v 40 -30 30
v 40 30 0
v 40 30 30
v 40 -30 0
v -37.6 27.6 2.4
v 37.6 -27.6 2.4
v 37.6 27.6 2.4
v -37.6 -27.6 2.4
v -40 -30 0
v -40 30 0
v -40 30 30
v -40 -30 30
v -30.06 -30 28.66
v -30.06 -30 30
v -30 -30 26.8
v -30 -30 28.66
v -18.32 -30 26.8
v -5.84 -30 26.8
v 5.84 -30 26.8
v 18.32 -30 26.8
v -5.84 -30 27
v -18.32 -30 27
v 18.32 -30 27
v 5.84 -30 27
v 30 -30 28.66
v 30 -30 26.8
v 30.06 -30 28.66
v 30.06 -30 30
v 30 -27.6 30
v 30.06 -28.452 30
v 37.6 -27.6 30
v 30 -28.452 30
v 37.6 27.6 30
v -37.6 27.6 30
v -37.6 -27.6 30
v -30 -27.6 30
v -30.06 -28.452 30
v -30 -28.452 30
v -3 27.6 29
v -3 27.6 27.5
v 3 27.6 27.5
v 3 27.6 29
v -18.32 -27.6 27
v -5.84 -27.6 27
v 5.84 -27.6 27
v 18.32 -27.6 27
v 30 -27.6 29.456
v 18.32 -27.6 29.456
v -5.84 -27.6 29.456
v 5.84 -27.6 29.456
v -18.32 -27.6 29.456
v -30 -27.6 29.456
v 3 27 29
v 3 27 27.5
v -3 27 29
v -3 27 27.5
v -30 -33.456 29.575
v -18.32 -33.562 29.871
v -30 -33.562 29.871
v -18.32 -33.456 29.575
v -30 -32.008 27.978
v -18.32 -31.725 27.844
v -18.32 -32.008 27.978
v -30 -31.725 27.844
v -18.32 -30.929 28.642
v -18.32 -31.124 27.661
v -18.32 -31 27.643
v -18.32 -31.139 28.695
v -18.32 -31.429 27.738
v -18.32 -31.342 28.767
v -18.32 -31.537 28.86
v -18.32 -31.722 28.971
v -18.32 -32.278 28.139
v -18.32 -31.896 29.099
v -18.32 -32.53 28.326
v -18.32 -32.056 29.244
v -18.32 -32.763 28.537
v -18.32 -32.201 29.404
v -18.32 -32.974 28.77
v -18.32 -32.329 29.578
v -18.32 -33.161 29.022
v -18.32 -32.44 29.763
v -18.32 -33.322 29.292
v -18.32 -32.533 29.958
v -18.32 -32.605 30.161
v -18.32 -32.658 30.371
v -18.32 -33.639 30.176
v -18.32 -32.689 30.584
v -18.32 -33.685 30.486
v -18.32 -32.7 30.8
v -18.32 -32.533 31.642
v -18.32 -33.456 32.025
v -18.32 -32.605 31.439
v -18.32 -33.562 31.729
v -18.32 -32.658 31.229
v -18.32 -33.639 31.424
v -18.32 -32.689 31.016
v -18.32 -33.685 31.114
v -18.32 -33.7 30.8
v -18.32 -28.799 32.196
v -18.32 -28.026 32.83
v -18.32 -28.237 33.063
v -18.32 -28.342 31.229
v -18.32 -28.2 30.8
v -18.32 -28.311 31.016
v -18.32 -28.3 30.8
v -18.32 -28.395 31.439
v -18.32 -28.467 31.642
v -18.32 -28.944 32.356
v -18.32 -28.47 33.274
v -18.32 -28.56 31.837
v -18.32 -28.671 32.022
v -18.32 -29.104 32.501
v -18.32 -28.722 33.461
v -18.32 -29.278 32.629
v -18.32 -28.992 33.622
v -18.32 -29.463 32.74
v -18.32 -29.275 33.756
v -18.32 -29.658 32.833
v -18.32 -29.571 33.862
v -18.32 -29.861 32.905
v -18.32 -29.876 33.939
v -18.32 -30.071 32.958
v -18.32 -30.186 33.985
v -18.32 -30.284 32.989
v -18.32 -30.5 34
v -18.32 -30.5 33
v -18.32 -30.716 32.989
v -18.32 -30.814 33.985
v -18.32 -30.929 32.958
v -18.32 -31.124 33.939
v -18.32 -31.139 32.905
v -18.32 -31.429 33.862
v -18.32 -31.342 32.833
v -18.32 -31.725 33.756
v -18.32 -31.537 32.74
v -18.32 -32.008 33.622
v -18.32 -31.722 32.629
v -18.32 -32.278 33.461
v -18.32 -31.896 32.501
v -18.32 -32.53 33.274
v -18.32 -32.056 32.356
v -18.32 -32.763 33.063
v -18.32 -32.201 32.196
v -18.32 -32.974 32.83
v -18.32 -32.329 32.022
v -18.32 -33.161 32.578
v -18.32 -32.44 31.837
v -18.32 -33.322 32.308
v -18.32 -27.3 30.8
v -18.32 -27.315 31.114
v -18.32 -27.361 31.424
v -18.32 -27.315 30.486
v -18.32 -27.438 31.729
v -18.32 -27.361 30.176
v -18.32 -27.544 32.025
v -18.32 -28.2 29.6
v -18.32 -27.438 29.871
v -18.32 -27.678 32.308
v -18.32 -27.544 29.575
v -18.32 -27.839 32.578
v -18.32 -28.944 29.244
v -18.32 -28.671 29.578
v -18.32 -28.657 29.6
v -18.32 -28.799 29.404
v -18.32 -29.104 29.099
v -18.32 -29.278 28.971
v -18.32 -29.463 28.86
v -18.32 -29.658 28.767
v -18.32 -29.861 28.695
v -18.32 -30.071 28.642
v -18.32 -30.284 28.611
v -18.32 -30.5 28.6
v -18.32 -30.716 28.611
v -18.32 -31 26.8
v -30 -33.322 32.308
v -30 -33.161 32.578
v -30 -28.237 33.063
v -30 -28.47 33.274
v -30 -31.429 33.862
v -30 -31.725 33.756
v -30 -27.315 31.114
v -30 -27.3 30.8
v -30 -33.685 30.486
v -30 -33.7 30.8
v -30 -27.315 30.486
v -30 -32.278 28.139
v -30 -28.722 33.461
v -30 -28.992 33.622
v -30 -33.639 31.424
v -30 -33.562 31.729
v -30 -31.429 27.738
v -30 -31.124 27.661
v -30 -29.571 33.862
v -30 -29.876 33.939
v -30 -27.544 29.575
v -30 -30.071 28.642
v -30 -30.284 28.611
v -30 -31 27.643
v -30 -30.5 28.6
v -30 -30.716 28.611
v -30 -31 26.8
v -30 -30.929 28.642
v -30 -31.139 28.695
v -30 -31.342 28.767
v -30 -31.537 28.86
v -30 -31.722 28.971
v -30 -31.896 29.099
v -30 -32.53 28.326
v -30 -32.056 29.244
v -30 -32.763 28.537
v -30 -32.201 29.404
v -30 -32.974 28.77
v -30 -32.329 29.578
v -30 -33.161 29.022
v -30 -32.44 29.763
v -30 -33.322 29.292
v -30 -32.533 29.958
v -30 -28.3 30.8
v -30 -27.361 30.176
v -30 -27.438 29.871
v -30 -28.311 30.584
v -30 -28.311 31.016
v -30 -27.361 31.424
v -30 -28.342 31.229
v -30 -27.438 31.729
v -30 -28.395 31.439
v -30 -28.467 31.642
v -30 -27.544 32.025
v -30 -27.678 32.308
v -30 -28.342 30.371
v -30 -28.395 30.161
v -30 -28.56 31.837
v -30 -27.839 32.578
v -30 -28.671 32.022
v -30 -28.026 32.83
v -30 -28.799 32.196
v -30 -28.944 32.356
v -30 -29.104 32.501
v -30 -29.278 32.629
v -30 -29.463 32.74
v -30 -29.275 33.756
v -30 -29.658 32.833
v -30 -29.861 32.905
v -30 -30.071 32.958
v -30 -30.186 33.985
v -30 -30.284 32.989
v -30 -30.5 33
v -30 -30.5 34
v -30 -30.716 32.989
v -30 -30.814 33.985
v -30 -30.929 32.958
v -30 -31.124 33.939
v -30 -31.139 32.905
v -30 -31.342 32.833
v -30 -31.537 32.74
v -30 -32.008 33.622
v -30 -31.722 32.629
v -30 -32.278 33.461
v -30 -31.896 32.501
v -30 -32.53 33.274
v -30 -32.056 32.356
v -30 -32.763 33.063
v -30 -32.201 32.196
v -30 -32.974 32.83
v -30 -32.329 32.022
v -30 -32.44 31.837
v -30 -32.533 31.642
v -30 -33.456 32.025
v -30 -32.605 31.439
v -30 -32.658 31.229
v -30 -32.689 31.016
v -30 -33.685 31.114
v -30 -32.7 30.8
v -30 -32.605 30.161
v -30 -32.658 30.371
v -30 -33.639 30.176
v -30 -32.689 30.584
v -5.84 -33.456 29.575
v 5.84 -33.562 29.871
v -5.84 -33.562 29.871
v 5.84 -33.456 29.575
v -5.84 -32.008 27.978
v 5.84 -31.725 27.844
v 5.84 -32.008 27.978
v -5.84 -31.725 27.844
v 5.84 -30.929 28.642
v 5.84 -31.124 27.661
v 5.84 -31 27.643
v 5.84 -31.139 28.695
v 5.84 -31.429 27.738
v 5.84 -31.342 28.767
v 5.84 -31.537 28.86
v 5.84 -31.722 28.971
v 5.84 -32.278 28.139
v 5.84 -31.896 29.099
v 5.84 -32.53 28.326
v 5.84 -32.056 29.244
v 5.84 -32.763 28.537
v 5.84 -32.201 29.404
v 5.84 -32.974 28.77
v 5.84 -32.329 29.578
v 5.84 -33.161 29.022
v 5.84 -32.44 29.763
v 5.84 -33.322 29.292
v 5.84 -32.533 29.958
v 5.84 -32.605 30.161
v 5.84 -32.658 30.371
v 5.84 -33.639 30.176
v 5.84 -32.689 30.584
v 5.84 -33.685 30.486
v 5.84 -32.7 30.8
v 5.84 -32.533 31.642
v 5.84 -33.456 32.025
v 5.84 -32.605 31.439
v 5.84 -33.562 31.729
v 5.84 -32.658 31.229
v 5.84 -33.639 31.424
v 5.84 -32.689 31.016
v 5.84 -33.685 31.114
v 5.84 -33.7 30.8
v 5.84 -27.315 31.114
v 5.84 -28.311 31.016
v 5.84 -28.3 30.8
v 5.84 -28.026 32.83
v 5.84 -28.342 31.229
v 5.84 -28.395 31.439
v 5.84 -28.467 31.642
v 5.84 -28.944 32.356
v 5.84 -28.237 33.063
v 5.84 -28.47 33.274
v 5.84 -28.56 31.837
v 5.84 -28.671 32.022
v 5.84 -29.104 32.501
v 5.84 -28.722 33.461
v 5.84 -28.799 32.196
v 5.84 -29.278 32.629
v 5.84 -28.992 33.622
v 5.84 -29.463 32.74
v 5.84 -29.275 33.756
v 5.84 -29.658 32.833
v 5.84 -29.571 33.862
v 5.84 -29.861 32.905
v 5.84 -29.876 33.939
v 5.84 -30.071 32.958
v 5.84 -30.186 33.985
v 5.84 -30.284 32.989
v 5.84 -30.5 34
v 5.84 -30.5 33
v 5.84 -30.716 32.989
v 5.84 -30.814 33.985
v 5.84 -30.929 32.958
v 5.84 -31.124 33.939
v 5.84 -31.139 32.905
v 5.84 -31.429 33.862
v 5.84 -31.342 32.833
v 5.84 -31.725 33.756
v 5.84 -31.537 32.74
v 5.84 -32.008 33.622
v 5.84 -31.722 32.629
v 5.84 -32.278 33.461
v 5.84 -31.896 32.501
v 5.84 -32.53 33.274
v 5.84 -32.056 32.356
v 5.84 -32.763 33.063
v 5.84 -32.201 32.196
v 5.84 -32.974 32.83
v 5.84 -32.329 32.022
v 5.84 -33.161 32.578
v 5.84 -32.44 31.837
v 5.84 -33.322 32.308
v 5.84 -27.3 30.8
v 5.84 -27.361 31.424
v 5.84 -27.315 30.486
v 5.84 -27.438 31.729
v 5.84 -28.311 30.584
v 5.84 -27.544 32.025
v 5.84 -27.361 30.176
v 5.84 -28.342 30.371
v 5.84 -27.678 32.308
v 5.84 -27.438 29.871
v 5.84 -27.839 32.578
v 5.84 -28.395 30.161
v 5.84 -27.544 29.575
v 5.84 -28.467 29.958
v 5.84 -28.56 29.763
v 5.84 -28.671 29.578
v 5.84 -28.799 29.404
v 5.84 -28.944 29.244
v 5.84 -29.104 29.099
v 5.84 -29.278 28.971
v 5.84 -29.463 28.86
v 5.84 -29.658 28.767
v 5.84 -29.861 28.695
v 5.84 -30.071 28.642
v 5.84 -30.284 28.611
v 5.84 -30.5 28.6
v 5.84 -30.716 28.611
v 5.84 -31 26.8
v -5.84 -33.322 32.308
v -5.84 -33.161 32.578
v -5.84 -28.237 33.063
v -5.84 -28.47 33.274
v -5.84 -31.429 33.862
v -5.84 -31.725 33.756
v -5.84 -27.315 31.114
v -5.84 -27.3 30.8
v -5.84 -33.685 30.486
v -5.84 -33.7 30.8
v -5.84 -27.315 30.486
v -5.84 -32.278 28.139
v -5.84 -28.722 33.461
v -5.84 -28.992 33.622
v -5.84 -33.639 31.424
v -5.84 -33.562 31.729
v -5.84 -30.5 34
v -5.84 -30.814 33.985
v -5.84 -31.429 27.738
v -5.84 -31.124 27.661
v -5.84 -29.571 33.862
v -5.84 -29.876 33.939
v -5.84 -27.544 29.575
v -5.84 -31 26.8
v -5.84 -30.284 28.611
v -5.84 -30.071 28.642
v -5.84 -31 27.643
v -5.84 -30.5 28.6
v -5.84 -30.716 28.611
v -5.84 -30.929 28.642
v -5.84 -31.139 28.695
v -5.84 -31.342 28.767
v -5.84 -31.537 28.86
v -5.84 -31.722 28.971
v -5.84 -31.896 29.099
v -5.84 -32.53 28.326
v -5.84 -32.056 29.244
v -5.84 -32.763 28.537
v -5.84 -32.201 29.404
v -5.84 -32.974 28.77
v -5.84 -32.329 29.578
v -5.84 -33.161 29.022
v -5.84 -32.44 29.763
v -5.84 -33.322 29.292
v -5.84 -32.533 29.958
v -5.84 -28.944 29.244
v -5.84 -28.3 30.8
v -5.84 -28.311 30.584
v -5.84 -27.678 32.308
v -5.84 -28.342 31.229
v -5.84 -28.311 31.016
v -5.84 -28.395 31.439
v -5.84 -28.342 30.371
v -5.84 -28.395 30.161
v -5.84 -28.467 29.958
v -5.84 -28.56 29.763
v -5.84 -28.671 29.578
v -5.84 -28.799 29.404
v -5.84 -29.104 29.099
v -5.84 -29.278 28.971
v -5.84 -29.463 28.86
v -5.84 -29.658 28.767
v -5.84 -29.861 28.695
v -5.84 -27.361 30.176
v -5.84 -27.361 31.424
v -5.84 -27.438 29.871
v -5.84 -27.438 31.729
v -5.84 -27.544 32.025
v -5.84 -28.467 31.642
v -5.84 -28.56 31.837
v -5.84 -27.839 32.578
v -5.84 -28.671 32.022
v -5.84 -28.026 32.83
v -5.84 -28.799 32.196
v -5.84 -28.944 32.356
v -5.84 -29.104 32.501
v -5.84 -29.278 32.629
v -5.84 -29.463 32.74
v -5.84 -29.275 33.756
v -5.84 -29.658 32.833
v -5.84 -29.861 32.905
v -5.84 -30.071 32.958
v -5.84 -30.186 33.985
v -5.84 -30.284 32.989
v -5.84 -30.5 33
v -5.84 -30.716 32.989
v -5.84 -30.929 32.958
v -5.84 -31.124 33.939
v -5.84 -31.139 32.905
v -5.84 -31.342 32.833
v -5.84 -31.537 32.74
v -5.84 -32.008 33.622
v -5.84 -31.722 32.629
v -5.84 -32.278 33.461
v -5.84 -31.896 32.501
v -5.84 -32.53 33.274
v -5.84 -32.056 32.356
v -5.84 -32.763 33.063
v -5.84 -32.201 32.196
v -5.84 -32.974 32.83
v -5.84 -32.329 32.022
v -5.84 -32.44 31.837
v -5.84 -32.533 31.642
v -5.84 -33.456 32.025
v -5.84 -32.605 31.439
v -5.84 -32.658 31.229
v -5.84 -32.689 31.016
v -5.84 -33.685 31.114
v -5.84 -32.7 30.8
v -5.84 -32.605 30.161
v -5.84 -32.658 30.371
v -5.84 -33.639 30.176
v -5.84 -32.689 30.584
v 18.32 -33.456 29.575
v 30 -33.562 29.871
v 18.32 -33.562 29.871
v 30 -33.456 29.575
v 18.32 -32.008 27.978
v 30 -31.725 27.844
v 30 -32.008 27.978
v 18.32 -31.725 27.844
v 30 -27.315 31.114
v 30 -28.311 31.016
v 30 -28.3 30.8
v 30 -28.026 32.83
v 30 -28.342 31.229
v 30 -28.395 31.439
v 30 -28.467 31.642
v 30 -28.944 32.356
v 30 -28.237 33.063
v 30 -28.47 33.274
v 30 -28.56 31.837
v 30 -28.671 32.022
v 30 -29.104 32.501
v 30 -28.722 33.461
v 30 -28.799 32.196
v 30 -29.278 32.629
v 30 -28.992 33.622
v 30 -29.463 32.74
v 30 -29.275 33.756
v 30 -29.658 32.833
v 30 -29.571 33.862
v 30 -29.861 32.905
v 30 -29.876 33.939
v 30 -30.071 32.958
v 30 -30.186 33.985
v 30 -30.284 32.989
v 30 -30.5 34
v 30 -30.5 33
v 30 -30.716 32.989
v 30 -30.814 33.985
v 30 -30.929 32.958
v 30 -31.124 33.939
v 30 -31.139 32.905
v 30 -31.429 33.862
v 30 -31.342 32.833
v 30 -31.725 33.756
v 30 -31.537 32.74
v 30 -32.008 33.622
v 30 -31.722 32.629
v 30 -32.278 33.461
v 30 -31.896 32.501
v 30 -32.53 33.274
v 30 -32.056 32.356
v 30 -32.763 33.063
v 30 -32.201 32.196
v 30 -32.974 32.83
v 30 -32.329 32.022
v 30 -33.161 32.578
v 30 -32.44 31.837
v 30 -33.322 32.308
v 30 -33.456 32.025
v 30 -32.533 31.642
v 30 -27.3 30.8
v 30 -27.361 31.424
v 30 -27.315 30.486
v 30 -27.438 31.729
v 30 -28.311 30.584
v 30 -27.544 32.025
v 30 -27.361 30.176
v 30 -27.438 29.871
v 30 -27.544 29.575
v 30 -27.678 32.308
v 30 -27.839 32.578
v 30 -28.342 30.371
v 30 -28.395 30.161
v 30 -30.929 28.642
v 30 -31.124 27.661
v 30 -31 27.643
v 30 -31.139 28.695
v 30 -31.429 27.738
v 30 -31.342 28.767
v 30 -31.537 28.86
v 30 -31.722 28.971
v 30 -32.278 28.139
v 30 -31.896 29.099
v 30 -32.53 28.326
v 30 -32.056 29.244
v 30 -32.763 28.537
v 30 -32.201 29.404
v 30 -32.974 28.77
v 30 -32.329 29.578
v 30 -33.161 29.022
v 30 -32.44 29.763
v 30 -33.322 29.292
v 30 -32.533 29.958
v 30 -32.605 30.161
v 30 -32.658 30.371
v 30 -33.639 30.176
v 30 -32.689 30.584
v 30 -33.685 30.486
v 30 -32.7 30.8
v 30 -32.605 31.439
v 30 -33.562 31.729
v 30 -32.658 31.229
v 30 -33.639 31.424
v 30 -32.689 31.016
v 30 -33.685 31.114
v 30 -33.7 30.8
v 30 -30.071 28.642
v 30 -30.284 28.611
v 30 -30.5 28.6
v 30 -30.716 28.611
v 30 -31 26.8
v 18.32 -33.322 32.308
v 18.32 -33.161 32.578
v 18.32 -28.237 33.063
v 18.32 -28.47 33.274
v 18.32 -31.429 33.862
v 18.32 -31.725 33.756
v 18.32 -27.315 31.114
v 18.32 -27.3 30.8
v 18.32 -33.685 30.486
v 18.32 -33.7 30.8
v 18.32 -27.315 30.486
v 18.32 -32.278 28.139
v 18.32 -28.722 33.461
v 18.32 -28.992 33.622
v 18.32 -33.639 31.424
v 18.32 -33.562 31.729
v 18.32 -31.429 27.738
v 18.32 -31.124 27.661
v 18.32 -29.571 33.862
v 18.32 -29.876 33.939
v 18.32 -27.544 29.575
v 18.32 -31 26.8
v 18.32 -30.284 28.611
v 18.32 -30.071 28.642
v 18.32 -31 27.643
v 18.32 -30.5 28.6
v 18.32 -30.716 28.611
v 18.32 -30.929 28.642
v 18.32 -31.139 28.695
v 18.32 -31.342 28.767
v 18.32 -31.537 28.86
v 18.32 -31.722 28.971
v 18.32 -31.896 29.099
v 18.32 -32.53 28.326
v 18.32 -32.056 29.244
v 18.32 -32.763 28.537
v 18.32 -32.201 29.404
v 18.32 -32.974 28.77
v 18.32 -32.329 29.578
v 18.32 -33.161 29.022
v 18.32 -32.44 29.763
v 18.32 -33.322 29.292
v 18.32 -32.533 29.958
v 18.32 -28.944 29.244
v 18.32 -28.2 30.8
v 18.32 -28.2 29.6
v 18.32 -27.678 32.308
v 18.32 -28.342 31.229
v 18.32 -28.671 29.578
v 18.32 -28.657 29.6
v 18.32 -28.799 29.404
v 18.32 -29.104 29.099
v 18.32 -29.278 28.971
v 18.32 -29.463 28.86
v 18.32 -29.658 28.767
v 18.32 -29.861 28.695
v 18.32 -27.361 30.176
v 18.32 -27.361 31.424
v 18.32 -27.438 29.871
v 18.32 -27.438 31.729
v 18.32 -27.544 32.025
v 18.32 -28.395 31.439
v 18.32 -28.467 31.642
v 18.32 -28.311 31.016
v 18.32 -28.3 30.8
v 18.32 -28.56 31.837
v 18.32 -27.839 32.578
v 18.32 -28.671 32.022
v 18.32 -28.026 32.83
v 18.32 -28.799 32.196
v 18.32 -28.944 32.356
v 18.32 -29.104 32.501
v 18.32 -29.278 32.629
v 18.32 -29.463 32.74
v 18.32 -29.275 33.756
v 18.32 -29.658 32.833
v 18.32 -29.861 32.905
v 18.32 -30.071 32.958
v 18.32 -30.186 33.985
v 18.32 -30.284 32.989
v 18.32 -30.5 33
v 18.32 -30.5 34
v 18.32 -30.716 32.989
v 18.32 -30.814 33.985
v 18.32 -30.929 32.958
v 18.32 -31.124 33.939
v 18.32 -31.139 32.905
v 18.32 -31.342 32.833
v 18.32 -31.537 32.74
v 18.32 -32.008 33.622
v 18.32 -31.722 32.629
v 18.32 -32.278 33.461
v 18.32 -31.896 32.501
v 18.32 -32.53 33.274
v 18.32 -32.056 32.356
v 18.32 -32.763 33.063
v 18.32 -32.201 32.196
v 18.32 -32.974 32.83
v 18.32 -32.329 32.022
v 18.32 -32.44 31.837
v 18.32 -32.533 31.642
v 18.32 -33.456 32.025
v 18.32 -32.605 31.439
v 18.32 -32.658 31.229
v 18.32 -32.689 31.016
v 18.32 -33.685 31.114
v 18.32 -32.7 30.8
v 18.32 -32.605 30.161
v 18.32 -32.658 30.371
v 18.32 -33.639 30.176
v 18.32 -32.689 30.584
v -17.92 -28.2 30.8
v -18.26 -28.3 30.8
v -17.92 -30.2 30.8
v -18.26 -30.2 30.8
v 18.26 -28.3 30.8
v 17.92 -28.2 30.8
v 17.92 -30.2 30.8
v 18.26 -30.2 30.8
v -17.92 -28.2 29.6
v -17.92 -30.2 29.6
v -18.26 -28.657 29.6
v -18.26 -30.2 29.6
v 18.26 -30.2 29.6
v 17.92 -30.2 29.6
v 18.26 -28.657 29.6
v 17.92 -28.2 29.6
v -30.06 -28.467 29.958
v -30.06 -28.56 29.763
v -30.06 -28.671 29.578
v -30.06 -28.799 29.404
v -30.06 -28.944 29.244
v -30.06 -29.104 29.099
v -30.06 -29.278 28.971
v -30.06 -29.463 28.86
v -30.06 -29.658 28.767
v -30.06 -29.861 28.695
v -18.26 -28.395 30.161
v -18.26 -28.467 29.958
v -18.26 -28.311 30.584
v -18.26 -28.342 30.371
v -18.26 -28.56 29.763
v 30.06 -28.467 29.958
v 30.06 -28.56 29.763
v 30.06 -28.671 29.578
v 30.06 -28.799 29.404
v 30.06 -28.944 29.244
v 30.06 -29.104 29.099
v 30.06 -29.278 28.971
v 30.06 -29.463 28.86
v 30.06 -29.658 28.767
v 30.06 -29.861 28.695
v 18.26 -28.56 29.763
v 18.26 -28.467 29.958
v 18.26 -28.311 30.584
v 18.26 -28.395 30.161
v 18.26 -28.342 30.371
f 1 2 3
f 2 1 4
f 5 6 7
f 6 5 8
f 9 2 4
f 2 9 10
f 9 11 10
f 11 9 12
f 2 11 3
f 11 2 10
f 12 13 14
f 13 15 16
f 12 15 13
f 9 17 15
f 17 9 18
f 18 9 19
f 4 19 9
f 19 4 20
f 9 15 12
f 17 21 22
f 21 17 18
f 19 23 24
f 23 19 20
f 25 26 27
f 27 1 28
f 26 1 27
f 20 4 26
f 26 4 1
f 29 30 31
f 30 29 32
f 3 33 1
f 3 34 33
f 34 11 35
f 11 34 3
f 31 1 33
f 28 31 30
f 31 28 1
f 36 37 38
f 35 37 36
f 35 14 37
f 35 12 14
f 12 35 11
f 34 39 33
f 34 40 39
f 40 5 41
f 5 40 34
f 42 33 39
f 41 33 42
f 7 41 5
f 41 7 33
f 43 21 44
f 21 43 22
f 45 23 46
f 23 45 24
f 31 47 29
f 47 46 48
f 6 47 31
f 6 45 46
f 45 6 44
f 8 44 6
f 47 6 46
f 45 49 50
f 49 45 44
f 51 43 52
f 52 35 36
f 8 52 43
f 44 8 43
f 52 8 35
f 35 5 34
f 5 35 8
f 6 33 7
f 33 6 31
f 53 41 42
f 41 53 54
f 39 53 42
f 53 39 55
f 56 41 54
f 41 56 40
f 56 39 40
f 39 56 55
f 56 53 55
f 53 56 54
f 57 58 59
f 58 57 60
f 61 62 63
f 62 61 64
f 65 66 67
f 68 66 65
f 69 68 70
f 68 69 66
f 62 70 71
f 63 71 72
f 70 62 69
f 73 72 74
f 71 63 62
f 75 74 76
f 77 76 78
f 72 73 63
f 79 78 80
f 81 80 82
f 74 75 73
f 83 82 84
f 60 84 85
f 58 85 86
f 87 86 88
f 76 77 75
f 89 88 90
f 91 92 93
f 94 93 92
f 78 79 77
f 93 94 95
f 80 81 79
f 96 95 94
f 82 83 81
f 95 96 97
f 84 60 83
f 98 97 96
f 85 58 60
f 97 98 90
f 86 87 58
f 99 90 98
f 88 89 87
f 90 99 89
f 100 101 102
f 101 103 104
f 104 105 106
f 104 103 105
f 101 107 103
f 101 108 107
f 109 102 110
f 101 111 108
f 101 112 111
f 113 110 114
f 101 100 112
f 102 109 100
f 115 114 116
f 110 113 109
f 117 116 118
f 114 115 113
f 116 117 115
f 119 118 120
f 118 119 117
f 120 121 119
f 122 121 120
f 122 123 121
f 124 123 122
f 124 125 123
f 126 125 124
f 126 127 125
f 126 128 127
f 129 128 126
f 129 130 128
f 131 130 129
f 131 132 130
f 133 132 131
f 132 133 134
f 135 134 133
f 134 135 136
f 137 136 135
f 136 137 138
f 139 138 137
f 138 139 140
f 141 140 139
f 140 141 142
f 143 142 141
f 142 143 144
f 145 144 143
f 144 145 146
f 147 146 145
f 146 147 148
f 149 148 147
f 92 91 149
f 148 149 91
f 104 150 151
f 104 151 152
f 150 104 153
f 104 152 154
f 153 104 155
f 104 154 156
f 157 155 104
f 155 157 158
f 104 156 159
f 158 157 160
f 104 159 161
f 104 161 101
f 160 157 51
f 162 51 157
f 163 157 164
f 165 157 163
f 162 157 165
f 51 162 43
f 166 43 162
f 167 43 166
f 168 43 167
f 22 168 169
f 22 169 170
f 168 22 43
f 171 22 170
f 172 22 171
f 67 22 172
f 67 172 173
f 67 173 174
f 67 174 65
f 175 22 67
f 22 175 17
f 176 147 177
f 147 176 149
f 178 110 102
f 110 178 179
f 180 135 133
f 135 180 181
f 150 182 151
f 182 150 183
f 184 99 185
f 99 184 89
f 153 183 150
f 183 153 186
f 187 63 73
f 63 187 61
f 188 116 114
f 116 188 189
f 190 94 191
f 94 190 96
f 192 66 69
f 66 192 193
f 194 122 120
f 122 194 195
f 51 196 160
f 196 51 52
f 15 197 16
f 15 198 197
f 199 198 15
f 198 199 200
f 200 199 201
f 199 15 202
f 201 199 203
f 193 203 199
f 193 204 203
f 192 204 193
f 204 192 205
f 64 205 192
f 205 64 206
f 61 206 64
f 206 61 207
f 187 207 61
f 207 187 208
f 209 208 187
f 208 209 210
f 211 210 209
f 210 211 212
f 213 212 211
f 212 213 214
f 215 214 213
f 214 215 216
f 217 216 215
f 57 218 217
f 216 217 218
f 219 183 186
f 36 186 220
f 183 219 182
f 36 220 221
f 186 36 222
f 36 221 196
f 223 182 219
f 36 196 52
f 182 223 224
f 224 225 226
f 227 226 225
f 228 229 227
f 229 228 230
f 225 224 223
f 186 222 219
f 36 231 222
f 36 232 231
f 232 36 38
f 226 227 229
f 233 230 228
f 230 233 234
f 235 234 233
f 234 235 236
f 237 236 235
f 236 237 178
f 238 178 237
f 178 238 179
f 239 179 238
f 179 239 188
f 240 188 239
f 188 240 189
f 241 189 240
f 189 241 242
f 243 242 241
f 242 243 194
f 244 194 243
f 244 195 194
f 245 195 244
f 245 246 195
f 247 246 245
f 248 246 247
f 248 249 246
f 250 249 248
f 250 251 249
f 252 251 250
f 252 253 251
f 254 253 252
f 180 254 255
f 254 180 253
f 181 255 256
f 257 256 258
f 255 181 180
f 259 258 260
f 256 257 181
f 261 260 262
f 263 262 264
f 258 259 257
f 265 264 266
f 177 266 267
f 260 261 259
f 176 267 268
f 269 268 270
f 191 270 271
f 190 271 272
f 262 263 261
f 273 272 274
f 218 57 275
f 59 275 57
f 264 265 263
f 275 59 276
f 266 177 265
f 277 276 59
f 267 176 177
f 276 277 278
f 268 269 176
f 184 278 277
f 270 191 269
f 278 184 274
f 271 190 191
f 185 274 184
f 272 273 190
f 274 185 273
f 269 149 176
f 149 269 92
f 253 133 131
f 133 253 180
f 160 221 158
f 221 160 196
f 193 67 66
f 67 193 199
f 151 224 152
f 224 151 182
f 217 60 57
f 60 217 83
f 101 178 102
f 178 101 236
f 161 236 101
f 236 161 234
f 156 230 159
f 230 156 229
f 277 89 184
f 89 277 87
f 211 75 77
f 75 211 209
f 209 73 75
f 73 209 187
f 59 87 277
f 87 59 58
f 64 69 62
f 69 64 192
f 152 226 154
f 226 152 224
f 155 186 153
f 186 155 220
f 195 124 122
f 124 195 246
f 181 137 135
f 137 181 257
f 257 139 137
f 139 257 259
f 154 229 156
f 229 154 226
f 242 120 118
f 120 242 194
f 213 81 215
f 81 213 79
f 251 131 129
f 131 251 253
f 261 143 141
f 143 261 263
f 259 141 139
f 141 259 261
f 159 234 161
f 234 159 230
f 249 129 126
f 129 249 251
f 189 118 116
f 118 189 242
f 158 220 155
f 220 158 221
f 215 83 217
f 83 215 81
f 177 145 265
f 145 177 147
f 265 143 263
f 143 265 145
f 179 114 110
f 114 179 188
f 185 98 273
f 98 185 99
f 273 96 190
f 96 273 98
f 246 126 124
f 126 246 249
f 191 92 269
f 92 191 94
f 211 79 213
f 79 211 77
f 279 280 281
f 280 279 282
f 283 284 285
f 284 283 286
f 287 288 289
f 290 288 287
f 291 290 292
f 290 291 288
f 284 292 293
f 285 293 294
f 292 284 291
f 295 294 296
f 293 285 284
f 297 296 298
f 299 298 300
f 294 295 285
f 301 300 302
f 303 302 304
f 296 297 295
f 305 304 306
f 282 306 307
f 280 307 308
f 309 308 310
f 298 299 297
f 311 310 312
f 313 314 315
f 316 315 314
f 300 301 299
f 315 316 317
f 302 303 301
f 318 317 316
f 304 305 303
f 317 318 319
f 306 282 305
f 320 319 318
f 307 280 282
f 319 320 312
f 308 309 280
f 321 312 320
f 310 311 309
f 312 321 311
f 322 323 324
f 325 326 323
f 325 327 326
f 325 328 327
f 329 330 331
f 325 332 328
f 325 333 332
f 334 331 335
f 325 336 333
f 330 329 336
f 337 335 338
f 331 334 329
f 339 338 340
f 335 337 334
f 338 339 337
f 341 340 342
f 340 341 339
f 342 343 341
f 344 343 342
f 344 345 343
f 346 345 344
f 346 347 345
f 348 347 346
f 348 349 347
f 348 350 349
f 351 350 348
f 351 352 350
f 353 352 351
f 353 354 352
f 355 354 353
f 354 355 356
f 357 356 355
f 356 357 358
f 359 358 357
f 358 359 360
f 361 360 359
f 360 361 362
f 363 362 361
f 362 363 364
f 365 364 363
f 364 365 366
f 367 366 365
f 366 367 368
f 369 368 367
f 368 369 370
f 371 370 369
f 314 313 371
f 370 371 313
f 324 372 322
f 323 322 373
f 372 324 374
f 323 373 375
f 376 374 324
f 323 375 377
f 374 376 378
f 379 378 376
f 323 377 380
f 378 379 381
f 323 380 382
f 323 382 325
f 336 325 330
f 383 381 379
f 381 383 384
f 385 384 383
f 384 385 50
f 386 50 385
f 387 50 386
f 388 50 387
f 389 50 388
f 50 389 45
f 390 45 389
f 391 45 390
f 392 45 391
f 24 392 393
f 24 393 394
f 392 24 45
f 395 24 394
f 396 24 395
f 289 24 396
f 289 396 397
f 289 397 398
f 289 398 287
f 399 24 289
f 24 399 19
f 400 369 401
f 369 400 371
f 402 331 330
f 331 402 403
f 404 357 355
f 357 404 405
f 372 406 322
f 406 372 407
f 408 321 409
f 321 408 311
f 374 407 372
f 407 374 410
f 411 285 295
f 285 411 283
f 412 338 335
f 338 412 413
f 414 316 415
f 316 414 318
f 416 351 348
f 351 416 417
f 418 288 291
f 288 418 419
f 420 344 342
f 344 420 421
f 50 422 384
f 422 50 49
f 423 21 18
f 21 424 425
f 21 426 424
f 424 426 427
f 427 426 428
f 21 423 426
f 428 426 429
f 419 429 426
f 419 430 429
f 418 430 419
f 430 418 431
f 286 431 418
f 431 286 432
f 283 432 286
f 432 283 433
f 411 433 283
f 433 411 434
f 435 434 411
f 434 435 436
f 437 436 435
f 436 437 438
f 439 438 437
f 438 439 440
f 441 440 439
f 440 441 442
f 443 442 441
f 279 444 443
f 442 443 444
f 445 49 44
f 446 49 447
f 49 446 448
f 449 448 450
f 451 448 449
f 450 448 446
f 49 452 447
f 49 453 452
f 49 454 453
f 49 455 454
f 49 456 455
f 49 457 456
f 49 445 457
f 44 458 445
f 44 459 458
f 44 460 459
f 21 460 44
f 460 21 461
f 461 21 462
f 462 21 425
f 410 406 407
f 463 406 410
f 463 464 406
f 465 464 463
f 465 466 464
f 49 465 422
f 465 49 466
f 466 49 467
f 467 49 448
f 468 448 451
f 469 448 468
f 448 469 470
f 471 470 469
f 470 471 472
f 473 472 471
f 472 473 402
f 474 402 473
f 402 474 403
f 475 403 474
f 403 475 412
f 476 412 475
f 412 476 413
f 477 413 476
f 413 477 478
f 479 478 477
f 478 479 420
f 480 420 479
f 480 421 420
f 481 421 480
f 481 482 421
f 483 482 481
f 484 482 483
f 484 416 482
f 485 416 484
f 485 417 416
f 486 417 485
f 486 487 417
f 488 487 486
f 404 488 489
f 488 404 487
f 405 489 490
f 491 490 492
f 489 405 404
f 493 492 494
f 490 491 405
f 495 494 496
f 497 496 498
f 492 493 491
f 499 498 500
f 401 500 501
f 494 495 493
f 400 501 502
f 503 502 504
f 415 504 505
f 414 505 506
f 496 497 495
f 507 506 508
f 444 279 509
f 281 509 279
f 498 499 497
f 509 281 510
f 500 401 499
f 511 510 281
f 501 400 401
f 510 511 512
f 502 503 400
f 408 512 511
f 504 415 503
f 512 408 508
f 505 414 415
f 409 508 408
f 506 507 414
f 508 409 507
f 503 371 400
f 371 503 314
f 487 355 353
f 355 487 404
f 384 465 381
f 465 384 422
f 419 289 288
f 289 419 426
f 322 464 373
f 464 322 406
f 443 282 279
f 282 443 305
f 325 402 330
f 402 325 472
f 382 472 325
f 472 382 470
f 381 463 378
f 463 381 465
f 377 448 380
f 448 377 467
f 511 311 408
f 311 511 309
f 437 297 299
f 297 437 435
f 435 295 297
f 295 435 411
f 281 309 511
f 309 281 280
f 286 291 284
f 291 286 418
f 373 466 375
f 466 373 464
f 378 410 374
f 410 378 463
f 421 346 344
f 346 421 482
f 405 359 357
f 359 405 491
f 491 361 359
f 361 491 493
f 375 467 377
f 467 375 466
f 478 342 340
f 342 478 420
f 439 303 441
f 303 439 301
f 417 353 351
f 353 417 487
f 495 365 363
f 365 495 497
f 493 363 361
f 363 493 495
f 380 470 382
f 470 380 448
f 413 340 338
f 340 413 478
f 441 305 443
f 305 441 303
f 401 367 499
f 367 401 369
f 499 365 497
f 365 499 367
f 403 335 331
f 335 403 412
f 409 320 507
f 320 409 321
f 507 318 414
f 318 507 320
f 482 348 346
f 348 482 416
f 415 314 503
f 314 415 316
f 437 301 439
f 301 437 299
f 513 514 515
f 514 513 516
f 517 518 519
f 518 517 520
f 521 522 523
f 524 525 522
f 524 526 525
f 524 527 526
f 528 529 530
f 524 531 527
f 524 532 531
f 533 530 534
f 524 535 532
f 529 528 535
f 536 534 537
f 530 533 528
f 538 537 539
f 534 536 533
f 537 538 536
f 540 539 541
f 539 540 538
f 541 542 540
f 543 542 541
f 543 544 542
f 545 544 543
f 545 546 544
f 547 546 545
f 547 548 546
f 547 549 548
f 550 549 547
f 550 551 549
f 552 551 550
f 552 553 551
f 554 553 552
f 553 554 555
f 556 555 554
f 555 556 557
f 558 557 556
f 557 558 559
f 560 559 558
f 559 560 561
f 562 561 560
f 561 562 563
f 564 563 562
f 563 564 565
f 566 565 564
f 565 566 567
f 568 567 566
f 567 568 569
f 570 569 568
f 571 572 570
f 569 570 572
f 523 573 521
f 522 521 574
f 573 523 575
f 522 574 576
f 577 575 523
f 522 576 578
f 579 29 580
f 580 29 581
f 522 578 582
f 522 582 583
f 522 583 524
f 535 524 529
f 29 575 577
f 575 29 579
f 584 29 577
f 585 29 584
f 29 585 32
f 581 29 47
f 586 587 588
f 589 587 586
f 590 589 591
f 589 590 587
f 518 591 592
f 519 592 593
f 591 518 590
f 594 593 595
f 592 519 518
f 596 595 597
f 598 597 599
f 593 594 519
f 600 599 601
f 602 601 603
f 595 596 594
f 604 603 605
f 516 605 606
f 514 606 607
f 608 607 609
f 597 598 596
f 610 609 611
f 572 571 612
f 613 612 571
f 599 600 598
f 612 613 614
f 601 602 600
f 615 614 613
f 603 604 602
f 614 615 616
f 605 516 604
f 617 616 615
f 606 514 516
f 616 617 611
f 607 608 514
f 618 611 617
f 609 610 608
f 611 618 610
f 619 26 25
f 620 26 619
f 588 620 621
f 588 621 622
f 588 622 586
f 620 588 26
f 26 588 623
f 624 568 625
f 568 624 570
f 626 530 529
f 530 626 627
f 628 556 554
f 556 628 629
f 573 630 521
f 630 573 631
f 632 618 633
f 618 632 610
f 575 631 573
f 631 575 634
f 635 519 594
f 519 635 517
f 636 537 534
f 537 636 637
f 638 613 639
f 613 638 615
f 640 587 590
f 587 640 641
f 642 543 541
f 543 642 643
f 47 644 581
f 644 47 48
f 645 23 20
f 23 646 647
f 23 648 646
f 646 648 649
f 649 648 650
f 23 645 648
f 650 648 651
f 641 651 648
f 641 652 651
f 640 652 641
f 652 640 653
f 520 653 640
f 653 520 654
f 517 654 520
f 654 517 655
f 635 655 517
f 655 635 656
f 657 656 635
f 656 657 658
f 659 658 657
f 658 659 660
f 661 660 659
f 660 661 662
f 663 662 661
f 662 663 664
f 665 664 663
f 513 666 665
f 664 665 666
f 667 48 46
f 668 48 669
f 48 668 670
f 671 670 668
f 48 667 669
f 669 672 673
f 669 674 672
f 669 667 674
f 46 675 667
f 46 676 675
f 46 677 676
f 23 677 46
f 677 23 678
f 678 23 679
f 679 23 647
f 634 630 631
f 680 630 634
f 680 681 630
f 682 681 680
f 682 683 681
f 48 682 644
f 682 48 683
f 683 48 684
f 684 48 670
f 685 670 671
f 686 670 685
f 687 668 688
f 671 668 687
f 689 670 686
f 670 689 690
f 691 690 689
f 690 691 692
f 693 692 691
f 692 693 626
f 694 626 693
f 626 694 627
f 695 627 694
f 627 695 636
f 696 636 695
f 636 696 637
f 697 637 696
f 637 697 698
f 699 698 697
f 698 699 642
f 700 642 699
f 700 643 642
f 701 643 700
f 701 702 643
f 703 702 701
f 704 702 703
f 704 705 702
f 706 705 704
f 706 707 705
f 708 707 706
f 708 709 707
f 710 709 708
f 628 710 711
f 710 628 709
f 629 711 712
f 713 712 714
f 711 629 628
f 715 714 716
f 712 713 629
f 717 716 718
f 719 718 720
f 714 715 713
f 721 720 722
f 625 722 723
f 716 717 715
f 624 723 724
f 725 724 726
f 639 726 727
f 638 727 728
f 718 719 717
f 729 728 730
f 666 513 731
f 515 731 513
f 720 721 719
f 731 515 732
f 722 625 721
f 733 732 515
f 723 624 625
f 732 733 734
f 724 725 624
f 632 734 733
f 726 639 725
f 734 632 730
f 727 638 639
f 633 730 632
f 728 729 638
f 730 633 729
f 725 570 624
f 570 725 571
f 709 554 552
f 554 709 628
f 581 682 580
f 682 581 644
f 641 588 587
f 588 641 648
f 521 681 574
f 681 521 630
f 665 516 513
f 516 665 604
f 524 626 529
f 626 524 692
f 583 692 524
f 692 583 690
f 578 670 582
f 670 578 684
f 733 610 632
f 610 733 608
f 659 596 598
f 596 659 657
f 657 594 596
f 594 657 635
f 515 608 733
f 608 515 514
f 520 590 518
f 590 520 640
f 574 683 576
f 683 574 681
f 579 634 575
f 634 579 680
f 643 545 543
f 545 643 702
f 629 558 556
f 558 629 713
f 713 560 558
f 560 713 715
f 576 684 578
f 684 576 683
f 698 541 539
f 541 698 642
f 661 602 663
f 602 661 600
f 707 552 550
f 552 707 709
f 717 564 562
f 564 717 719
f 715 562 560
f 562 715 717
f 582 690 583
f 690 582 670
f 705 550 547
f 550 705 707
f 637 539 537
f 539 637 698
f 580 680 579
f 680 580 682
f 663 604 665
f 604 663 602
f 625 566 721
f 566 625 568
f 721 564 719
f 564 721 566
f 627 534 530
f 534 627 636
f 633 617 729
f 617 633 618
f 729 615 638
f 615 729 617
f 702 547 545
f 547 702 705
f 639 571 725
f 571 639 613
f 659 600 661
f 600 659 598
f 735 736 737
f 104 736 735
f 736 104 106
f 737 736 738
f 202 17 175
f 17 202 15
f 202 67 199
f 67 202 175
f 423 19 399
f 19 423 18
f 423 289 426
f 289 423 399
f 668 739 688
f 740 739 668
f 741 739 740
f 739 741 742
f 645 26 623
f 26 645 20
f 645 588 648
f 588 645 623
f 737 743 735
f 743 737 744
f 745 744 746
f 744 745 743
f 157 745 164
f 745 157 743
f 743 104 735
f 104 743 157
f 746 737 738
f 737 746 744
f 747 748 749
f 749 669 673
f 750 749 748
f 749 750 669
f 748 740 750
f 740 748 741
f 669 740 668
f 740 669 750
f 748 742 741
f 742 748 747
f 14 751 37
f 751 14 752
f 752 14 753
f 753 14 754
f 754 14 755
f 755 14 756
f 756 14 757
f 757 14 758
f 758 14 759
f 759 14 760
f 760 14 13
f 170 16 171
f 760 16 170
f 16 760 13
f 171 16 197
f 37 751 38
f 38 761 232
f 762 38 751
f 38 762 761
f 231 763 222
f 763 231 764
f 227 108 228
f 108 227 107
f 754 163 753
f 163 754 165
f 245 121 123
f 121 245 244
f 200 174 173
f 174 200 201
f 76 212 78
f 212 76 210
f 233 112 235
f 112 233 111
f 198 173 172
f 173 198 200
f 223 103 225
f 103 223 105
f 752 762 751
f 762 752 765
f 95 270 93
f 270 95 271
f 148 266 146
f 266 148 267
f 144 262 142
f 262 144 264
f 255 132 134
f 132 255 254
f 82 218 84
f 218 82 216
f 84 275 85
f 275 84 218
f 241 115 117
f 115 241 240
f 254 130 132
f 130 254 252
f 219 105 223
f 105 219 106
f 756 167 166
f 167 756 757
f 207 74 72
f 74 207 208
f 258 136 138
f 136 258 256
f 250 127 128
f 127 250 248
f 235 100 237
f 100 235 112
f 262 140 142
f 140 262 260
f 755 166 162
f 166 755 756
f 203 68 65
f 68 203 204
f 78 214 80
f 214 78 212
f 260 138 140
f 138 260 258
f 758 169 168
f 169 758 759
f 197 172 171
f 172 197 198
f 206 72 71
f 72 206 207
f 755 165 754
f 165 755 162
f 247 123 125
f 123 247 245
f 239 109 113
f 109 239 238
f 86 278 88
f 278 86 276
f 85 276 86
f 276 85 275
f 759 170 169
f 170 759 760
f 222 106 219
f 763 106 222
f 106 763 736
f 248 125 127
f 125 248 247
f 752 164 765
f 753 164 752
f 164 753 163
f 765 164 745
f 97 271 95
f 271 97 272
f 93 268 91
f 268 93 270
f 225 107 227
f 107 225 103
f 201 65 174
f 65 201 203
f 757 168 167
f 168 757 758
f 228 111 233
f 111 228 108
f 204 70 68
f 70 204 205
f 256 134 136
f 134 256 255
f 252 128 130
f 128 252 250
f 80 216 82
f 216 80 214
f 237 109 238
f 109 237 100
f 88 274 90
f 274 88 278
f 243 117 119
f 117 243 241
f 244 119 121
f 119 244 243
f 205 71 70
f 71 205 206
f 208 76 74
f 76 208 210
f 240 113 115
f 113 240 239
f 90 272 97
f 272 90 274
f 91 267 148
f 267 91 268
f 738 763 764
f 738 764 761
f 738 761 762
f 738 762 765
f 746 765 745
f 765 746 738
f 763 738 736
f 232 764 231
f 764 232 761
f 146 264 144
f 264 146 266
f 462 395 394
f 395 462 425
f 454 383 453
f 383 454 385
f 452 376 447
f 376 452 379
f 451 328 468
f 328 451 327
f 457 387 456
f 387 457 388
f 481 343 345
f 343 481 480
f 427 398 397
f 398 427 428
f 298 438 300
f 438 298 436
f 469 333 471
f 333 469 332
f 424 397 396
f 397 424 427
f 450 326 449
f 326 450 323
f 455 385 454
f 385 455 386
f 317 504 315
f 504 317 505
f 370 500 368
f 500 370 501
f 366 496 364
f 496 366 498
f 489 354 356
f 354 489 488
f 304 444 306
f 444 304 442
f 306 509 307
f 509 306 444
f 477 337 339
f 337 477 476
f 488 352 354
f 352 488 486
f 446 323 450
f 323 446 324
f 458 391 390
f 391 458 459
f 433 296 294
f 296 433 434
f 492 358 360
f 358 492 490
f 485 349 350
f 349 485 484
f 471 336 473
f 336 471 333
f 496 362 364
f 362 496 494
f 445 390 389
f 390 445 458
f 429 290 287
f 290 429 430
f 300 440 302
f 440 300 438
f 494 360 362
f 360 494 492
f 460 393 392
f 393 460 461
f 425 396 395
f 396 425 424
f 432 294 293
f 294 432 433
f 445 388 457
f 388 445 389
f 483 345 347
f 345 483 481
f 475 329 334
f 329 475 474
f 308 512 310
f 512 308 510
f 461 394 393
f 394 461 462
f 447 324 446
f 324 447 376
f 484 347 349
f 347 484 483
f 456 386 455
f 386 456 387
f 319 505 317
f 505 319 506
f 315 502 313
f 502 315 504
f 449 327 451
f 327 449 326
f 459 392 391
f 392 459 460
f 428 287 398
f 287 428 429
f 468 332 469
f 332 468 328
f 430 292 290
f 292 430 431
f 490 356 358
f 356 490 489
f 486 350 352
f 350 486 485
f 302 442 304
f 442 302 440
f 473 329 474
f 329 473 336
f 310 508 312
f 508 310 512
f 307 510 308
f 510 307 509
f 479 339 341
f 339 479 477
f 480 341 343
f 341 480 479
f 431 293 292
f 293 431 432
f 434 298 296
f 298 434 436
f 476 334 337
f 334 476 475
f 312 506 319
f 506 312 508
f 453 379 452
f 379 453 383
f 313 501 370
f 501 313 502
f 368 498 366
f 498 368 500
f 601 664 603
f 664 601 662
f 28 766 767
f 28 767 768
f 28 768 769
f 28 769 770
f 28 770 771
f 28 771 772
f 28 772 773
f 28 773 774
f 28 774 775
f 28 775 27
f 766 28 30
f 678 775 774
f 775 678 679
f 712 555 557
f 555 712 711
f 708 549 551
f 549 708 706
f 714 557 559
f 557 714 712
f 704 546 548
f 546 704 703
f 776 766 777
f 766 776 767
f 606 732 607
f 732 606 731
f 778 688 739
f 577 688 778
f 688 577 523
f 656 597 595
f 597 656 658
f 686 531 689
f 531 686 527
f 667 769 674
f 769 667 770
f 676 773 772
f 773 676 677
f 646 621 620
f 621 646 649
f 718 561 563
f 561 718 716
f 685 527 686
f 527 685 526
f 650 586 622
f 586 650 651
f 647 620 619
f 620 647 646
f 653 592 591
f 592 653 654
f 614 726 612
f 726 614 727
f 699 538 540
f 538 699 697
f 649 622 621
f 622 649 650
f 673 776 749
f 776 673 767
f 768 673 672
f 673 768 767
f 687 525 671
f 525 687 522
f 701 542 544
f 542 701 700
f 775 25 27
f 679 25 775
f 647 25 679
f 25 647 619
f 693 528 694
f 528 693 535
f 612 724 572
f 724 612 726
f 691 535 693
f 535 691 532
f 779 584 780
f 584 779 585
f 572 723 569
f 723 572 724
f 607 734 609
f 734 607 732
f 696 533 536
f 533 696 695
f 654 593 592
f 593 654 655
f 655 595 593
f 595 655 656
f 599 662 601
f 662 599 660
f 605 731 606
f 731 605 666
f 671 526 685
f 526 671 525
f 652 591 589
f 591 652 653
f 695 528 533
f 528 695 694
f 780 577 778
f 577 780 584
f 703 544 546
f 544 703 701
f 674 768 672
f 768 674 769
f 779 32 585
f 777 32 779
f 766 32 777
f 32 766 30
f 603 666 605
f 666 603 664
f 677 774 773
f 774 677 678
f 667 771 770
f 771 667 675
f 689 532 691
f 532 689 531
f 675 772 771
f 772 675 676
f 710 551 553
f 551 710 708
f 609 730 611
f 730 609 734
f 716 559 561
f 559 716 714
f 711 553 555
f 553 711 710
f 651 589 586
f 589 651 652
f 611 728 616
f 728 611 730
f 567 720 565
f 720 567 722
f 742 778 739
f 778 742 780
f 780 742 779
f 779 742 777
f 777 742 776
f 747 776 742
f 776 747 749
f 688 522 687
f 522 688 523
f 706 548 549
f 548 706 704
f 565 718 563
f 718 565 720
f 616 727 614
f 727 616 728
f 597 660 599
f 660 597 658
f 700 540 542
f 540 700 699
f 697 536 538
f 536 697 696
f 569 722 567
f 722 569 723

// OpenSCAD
// Box with print-in-place hinge (v4: bridge webs to kill band overhangs)
part = "box";
cadverify_only = "";
module instance(name, part, unit = 1) {
    echo(cadverify_instance = [name, part, unit]);
    if (cadverify_only == "" || cadverify_only == name) children();
}

Rkn = 3.2; rbore = 2.2; rpin = 1.9;
yh = -30.5; zh = 30.8;
lid_zh = 3.4;
lid_lift = 27.4;
pin_lift_z = 27.8; pin_shift_y = -30.5;
k0x0=-30; k0x1=-18.32;
k1x0=-17.92; k1x1=-6.24;
k2x0=-5.84; k2x1=5.84;
k3x0=6.24; k3x1=17.92;
k4x0=18.32; k4x1=30;

$fn = 64;

module xcyl(x0, x1, r, y, z) {
    translate([x0, y, z]) rotate([0, 90, 0]) cylinder(r = r, h = x1 - x0);
}

module box_part() {
    difference() {
        union() {
            translate([-40, -30, 0]) cube([80, 60, 2.4]);
            translate([-40, 27.6, 2.4]) cube([80, 2.4, 27.6]);
            translate([-40, -30, 2.4]) cube([80, 2.4, 24.6]);
            translate([-40, -30, 27.0]) cube([11, 2.4, 3.0]);
            translate([29, -30, 27.0]) cube([11, 2.4, 3.0]);
            translate([-40, -27.6, 2.4]) cube([2.4, 55.2, 27.6]);
            translate([37.6, -27.6, 2.4]) cube([2.4, 55.2, 27.6]);
            translate([-3, 27.0, 27.5]) cube([6, 0.6, 1.5]);
            // hinge knuckles + support webs tying them to the back wall
            xcyl(k0x0, k0x1, Rkn, yh, zh);
            xcyl(k2x0, k2x1, Rkn, yh, zh);
            xcyl(k4x0, k4x1, Rkn, yh, zh);
            translate([k0x0, -31, 26.8]) cube([k0x1-k0x0, 3.4, 4.0]);
            translate([k2x0, -31, 26.8]) cube([k2x1-k2x0, 3.4, 4.0]);
            translate([k4x0, -31, 26.8]) cube([k4x1-k4x0, 3.4, 4.0]);
            // two bridge webs filling wall-to-knuckle band gaps (support-free cover)
            translate([-18.32, -30.2, 29.6]) cube([0.4, 2.0, 1.2]);
            translate([17.92, -30.2, 29.6]) cube([0.4, 2.0, 1.2]);
        }
        xcyl(k0x0-0.06, k0x1+0.06, rbore, yh, zh);
        xcyl(k2x0-0.06, k2x1+0.06, rbore, yh, zh);
        xcyl(k4x0-0.06, k4x1+0.06, rbore, yh, zh);
    }
}

module lid_part() {
    difference() {
        union() {
            translate([-40, -30, 10.6]) cube([80, 60, 2.4]);
            translate([-40, 27.6, 3]) cube([80, 2.4, 7.6]);
            translate([k1x0, -30, 3]) cube([k1x1-k1x0, 2.4, 7.6]);
            translate([k3x0, -30, 3]) cube([k3x1-k3x0, 2.4, 7.6]);
            translate([-40, -30, 3]) cube([11, 2.4, 7.6]);
            translate([29, -30, 3]) cube([11, 2.4, 7.6]);
            translate([-40, -27.6, 3]) cube([2.4, 55.2, 7.6]);
            translate([37.6, -27.6, 3]) cube([2.4, 55.2, 7.6]);
            translate([-37.2, 25.2, 0]) cube([74.4, 2.0, 10.6]);
            translate([-37.2, -27.2, 0]) cube([74.4, 2.0, 10.6]);
            translate([-37.2, -25.2, 0]) cube([2.0, 50.4, 10.6]);
            translate([35.2, -25.2, 0]) cube([2.0, 50.4, 10.6]);
            xcyl(k1x0, k1x1, Rkn, yh, lid_zh);
            xcyl(k3x0, k3x1, Rkn, yh, lid_zh);
            translate([k1x0, -31, 0]) cube([k1x1-k1x0, 3.4, 5]);
            translate([k3x0, -31, 0]) cube([k3x1-k3x0, 3.4, 5]);
            // filler webs closing lid-knuckle band overlap with box lugs
            translate([-6.24, -30.2, 0]) cube([0.4, 2.0, 1.2]);
            translate([5.84, -30.2, 0]) cube([0.4, 2.0, 1.2]);
        }
        xcyl(k1x0-0.06, k1x1+0.06, rbore, yh, lid_zh);
        xcyl(k3x0-0.06, k3x1+0.06, rbore, yh, lid_zh);
        translate([-3.3, 26.3, -0.05]) cube([6.6, 1.5, 2.05]);
    }
}

module pin_part() {
    union() {
        xcyl(-32.4, 32.4, rpin, 0, 3);
        xcyl(30.4, 32.4, 3, 0, 3);
        xcyl(-32.4, -30.4, 3, 0, 3);
    }
}

if (part == "box") {
    echo(cadverify_spec = [
        ["bounds", [[-40, -33.7, 0], [40, 30, 34.0]]],
        ["bodies", 1],
        ["through_holes", 3],
        ["support_faces", [["bed", "-z", 4000]]],
        ["overhangs_allowed", [["hinge knuckles, bores and wall cutouts print in place", [[-30.2, -33.9, 26.5], [30.2, -27.1, 33.5]]]]],
        ["copies", 1],
        ["details", [
            ["floor", "thickness", [0, 0, -1], [0, 0, 1], 2.4],
            ["front_wall", "thickness", [0, 31, 15], [0, -1, 0], 2.4],
            ["cavity", "void", [[-37.6, -27.6, 2.4], [37.6, 27.6, 29.9]], 0.9],
            ["hinge_bore", "hole", [-31, -30.5, 30.8], [1, 0, 0], [[0, 4.4], [11.6, 4.4]]],
            ["catch_bump", "material", [[-3, 27.0, 27.5], [3, 27.6, 29.0]], 0.9],
            ["hinge_view", "view", [[-30, -34, 26.5], [30, -27, 34.5]]]
        ]]
    ]);
    box_part();
} else if (part == "lid") {
    echo(cadverify_spec = [
        ["bounds", [[-40, -33.7, 0], [40, 30, 13]]],
        ["bodies", 1],
        ["through_holes", 2],
        ["support_faces", [["bed", "-z", 300]]],
        ["overhangs_allowed", [
            ["hinge knuckles and bores print in place", [[-18.2, -33.9, 0], [18.2, -27.1, 4.2]]],
            ["lid top bridging over plug cavity", [[-37.2, -24.9, 10.1], [37.2, 25.2, 11.1]]]
        ]],
        ["copies", 1],
        ["details", [
            ["top", "thickness", [0, 0, 14], [0, 0, -1], 2.4],
            ["skirt", "thickness", [0, 31, 6], [0, -1, 0], 2.4],
            ["plug_cavity", "void", [[-35.2, -24.9, 0], [35.2, 25.2, 10.5]], 0.9],
            ["hinge_bore", "hole", [-18.6, -30.5, 3.4], [1, 0, 0], [[0, 4.4], [11.6, 4.4]]],
            ["catch_notch", "void", [[-3.3, 26.3, 0], [3.3, 27.8, 2.0]], 0.9],
            ["catch_view", "view", [[-5, 26, 0], [5, 28.5, 3]]]
        ]]
    ]);
    lid_part();
} else if (part == "pin") {
    echo(cadverify_spec = [
        ["bounds", [[-32.4, -3, 0], [32.4, 3, 6]]],
        ["bodies", 1],
        ["support_faces", []],
        ["overhangs_allowed", [["pin shaft underside bridges with 0.3 gap", [[-32.4, -1.9, 0], [32.4, 1.9, 1.6]]]]],
        ["copies", 1],
        ["details", [
            ["shaft", "thickness", [0, 3, 3], [0, -1, 0], 3.8],
            ["head", "material", [[30.4, -3, 0], [32.4, 3, 6]], 0.7],
            ["pin_view", "view", [[-32.4, -3, 0], [32.4, 3, 6]]]
        ]]
    ]);
    pin_part();
} else if (part == "assembly") {
    echo(cadverify_spec = [
        ["bounds", [[-40, -33.7, 0], [40, 30, 40.4]]],
        ["support_faces", [["bed", "-z", 4000]]],
        ["allowed_interferences", []],
        ["motions", [
            ["lid_open", ["lid"], "rotate", [0, -30.5, 30.8], [1, 0, 0], [0, 110], ["flex", [["lid", "box", 0.5, "catch bump clearance pass"]]]]
        ]],
        ["assembly_order", [
            [["box"], [0, 0, 0]],
            [["lid"], [0, 0, -1]],
            [["pin"], [1, 0, 0]]
        ]],
        ["print_in_place", 0.3],
        ["overhangs_allowed", [
            ["hinge undersides, pin bridge and cutouts in place", [[-33, -34, 26.5], [33, -27, 34.8]]],
            ["lid top bridging over box cavity", [[-37.2, -24.9, 37.5], [37.2, 25.2, 38.5]]]
        ]]
    ]);
    instance("box", "box") box_part();
    instance("lid", "lid") translate([0, 0, lid_lift]) lid_part();
    instance("pin", "pin") translate([0, pin_shift_y, pin_lift_z]) pin_part();
}
